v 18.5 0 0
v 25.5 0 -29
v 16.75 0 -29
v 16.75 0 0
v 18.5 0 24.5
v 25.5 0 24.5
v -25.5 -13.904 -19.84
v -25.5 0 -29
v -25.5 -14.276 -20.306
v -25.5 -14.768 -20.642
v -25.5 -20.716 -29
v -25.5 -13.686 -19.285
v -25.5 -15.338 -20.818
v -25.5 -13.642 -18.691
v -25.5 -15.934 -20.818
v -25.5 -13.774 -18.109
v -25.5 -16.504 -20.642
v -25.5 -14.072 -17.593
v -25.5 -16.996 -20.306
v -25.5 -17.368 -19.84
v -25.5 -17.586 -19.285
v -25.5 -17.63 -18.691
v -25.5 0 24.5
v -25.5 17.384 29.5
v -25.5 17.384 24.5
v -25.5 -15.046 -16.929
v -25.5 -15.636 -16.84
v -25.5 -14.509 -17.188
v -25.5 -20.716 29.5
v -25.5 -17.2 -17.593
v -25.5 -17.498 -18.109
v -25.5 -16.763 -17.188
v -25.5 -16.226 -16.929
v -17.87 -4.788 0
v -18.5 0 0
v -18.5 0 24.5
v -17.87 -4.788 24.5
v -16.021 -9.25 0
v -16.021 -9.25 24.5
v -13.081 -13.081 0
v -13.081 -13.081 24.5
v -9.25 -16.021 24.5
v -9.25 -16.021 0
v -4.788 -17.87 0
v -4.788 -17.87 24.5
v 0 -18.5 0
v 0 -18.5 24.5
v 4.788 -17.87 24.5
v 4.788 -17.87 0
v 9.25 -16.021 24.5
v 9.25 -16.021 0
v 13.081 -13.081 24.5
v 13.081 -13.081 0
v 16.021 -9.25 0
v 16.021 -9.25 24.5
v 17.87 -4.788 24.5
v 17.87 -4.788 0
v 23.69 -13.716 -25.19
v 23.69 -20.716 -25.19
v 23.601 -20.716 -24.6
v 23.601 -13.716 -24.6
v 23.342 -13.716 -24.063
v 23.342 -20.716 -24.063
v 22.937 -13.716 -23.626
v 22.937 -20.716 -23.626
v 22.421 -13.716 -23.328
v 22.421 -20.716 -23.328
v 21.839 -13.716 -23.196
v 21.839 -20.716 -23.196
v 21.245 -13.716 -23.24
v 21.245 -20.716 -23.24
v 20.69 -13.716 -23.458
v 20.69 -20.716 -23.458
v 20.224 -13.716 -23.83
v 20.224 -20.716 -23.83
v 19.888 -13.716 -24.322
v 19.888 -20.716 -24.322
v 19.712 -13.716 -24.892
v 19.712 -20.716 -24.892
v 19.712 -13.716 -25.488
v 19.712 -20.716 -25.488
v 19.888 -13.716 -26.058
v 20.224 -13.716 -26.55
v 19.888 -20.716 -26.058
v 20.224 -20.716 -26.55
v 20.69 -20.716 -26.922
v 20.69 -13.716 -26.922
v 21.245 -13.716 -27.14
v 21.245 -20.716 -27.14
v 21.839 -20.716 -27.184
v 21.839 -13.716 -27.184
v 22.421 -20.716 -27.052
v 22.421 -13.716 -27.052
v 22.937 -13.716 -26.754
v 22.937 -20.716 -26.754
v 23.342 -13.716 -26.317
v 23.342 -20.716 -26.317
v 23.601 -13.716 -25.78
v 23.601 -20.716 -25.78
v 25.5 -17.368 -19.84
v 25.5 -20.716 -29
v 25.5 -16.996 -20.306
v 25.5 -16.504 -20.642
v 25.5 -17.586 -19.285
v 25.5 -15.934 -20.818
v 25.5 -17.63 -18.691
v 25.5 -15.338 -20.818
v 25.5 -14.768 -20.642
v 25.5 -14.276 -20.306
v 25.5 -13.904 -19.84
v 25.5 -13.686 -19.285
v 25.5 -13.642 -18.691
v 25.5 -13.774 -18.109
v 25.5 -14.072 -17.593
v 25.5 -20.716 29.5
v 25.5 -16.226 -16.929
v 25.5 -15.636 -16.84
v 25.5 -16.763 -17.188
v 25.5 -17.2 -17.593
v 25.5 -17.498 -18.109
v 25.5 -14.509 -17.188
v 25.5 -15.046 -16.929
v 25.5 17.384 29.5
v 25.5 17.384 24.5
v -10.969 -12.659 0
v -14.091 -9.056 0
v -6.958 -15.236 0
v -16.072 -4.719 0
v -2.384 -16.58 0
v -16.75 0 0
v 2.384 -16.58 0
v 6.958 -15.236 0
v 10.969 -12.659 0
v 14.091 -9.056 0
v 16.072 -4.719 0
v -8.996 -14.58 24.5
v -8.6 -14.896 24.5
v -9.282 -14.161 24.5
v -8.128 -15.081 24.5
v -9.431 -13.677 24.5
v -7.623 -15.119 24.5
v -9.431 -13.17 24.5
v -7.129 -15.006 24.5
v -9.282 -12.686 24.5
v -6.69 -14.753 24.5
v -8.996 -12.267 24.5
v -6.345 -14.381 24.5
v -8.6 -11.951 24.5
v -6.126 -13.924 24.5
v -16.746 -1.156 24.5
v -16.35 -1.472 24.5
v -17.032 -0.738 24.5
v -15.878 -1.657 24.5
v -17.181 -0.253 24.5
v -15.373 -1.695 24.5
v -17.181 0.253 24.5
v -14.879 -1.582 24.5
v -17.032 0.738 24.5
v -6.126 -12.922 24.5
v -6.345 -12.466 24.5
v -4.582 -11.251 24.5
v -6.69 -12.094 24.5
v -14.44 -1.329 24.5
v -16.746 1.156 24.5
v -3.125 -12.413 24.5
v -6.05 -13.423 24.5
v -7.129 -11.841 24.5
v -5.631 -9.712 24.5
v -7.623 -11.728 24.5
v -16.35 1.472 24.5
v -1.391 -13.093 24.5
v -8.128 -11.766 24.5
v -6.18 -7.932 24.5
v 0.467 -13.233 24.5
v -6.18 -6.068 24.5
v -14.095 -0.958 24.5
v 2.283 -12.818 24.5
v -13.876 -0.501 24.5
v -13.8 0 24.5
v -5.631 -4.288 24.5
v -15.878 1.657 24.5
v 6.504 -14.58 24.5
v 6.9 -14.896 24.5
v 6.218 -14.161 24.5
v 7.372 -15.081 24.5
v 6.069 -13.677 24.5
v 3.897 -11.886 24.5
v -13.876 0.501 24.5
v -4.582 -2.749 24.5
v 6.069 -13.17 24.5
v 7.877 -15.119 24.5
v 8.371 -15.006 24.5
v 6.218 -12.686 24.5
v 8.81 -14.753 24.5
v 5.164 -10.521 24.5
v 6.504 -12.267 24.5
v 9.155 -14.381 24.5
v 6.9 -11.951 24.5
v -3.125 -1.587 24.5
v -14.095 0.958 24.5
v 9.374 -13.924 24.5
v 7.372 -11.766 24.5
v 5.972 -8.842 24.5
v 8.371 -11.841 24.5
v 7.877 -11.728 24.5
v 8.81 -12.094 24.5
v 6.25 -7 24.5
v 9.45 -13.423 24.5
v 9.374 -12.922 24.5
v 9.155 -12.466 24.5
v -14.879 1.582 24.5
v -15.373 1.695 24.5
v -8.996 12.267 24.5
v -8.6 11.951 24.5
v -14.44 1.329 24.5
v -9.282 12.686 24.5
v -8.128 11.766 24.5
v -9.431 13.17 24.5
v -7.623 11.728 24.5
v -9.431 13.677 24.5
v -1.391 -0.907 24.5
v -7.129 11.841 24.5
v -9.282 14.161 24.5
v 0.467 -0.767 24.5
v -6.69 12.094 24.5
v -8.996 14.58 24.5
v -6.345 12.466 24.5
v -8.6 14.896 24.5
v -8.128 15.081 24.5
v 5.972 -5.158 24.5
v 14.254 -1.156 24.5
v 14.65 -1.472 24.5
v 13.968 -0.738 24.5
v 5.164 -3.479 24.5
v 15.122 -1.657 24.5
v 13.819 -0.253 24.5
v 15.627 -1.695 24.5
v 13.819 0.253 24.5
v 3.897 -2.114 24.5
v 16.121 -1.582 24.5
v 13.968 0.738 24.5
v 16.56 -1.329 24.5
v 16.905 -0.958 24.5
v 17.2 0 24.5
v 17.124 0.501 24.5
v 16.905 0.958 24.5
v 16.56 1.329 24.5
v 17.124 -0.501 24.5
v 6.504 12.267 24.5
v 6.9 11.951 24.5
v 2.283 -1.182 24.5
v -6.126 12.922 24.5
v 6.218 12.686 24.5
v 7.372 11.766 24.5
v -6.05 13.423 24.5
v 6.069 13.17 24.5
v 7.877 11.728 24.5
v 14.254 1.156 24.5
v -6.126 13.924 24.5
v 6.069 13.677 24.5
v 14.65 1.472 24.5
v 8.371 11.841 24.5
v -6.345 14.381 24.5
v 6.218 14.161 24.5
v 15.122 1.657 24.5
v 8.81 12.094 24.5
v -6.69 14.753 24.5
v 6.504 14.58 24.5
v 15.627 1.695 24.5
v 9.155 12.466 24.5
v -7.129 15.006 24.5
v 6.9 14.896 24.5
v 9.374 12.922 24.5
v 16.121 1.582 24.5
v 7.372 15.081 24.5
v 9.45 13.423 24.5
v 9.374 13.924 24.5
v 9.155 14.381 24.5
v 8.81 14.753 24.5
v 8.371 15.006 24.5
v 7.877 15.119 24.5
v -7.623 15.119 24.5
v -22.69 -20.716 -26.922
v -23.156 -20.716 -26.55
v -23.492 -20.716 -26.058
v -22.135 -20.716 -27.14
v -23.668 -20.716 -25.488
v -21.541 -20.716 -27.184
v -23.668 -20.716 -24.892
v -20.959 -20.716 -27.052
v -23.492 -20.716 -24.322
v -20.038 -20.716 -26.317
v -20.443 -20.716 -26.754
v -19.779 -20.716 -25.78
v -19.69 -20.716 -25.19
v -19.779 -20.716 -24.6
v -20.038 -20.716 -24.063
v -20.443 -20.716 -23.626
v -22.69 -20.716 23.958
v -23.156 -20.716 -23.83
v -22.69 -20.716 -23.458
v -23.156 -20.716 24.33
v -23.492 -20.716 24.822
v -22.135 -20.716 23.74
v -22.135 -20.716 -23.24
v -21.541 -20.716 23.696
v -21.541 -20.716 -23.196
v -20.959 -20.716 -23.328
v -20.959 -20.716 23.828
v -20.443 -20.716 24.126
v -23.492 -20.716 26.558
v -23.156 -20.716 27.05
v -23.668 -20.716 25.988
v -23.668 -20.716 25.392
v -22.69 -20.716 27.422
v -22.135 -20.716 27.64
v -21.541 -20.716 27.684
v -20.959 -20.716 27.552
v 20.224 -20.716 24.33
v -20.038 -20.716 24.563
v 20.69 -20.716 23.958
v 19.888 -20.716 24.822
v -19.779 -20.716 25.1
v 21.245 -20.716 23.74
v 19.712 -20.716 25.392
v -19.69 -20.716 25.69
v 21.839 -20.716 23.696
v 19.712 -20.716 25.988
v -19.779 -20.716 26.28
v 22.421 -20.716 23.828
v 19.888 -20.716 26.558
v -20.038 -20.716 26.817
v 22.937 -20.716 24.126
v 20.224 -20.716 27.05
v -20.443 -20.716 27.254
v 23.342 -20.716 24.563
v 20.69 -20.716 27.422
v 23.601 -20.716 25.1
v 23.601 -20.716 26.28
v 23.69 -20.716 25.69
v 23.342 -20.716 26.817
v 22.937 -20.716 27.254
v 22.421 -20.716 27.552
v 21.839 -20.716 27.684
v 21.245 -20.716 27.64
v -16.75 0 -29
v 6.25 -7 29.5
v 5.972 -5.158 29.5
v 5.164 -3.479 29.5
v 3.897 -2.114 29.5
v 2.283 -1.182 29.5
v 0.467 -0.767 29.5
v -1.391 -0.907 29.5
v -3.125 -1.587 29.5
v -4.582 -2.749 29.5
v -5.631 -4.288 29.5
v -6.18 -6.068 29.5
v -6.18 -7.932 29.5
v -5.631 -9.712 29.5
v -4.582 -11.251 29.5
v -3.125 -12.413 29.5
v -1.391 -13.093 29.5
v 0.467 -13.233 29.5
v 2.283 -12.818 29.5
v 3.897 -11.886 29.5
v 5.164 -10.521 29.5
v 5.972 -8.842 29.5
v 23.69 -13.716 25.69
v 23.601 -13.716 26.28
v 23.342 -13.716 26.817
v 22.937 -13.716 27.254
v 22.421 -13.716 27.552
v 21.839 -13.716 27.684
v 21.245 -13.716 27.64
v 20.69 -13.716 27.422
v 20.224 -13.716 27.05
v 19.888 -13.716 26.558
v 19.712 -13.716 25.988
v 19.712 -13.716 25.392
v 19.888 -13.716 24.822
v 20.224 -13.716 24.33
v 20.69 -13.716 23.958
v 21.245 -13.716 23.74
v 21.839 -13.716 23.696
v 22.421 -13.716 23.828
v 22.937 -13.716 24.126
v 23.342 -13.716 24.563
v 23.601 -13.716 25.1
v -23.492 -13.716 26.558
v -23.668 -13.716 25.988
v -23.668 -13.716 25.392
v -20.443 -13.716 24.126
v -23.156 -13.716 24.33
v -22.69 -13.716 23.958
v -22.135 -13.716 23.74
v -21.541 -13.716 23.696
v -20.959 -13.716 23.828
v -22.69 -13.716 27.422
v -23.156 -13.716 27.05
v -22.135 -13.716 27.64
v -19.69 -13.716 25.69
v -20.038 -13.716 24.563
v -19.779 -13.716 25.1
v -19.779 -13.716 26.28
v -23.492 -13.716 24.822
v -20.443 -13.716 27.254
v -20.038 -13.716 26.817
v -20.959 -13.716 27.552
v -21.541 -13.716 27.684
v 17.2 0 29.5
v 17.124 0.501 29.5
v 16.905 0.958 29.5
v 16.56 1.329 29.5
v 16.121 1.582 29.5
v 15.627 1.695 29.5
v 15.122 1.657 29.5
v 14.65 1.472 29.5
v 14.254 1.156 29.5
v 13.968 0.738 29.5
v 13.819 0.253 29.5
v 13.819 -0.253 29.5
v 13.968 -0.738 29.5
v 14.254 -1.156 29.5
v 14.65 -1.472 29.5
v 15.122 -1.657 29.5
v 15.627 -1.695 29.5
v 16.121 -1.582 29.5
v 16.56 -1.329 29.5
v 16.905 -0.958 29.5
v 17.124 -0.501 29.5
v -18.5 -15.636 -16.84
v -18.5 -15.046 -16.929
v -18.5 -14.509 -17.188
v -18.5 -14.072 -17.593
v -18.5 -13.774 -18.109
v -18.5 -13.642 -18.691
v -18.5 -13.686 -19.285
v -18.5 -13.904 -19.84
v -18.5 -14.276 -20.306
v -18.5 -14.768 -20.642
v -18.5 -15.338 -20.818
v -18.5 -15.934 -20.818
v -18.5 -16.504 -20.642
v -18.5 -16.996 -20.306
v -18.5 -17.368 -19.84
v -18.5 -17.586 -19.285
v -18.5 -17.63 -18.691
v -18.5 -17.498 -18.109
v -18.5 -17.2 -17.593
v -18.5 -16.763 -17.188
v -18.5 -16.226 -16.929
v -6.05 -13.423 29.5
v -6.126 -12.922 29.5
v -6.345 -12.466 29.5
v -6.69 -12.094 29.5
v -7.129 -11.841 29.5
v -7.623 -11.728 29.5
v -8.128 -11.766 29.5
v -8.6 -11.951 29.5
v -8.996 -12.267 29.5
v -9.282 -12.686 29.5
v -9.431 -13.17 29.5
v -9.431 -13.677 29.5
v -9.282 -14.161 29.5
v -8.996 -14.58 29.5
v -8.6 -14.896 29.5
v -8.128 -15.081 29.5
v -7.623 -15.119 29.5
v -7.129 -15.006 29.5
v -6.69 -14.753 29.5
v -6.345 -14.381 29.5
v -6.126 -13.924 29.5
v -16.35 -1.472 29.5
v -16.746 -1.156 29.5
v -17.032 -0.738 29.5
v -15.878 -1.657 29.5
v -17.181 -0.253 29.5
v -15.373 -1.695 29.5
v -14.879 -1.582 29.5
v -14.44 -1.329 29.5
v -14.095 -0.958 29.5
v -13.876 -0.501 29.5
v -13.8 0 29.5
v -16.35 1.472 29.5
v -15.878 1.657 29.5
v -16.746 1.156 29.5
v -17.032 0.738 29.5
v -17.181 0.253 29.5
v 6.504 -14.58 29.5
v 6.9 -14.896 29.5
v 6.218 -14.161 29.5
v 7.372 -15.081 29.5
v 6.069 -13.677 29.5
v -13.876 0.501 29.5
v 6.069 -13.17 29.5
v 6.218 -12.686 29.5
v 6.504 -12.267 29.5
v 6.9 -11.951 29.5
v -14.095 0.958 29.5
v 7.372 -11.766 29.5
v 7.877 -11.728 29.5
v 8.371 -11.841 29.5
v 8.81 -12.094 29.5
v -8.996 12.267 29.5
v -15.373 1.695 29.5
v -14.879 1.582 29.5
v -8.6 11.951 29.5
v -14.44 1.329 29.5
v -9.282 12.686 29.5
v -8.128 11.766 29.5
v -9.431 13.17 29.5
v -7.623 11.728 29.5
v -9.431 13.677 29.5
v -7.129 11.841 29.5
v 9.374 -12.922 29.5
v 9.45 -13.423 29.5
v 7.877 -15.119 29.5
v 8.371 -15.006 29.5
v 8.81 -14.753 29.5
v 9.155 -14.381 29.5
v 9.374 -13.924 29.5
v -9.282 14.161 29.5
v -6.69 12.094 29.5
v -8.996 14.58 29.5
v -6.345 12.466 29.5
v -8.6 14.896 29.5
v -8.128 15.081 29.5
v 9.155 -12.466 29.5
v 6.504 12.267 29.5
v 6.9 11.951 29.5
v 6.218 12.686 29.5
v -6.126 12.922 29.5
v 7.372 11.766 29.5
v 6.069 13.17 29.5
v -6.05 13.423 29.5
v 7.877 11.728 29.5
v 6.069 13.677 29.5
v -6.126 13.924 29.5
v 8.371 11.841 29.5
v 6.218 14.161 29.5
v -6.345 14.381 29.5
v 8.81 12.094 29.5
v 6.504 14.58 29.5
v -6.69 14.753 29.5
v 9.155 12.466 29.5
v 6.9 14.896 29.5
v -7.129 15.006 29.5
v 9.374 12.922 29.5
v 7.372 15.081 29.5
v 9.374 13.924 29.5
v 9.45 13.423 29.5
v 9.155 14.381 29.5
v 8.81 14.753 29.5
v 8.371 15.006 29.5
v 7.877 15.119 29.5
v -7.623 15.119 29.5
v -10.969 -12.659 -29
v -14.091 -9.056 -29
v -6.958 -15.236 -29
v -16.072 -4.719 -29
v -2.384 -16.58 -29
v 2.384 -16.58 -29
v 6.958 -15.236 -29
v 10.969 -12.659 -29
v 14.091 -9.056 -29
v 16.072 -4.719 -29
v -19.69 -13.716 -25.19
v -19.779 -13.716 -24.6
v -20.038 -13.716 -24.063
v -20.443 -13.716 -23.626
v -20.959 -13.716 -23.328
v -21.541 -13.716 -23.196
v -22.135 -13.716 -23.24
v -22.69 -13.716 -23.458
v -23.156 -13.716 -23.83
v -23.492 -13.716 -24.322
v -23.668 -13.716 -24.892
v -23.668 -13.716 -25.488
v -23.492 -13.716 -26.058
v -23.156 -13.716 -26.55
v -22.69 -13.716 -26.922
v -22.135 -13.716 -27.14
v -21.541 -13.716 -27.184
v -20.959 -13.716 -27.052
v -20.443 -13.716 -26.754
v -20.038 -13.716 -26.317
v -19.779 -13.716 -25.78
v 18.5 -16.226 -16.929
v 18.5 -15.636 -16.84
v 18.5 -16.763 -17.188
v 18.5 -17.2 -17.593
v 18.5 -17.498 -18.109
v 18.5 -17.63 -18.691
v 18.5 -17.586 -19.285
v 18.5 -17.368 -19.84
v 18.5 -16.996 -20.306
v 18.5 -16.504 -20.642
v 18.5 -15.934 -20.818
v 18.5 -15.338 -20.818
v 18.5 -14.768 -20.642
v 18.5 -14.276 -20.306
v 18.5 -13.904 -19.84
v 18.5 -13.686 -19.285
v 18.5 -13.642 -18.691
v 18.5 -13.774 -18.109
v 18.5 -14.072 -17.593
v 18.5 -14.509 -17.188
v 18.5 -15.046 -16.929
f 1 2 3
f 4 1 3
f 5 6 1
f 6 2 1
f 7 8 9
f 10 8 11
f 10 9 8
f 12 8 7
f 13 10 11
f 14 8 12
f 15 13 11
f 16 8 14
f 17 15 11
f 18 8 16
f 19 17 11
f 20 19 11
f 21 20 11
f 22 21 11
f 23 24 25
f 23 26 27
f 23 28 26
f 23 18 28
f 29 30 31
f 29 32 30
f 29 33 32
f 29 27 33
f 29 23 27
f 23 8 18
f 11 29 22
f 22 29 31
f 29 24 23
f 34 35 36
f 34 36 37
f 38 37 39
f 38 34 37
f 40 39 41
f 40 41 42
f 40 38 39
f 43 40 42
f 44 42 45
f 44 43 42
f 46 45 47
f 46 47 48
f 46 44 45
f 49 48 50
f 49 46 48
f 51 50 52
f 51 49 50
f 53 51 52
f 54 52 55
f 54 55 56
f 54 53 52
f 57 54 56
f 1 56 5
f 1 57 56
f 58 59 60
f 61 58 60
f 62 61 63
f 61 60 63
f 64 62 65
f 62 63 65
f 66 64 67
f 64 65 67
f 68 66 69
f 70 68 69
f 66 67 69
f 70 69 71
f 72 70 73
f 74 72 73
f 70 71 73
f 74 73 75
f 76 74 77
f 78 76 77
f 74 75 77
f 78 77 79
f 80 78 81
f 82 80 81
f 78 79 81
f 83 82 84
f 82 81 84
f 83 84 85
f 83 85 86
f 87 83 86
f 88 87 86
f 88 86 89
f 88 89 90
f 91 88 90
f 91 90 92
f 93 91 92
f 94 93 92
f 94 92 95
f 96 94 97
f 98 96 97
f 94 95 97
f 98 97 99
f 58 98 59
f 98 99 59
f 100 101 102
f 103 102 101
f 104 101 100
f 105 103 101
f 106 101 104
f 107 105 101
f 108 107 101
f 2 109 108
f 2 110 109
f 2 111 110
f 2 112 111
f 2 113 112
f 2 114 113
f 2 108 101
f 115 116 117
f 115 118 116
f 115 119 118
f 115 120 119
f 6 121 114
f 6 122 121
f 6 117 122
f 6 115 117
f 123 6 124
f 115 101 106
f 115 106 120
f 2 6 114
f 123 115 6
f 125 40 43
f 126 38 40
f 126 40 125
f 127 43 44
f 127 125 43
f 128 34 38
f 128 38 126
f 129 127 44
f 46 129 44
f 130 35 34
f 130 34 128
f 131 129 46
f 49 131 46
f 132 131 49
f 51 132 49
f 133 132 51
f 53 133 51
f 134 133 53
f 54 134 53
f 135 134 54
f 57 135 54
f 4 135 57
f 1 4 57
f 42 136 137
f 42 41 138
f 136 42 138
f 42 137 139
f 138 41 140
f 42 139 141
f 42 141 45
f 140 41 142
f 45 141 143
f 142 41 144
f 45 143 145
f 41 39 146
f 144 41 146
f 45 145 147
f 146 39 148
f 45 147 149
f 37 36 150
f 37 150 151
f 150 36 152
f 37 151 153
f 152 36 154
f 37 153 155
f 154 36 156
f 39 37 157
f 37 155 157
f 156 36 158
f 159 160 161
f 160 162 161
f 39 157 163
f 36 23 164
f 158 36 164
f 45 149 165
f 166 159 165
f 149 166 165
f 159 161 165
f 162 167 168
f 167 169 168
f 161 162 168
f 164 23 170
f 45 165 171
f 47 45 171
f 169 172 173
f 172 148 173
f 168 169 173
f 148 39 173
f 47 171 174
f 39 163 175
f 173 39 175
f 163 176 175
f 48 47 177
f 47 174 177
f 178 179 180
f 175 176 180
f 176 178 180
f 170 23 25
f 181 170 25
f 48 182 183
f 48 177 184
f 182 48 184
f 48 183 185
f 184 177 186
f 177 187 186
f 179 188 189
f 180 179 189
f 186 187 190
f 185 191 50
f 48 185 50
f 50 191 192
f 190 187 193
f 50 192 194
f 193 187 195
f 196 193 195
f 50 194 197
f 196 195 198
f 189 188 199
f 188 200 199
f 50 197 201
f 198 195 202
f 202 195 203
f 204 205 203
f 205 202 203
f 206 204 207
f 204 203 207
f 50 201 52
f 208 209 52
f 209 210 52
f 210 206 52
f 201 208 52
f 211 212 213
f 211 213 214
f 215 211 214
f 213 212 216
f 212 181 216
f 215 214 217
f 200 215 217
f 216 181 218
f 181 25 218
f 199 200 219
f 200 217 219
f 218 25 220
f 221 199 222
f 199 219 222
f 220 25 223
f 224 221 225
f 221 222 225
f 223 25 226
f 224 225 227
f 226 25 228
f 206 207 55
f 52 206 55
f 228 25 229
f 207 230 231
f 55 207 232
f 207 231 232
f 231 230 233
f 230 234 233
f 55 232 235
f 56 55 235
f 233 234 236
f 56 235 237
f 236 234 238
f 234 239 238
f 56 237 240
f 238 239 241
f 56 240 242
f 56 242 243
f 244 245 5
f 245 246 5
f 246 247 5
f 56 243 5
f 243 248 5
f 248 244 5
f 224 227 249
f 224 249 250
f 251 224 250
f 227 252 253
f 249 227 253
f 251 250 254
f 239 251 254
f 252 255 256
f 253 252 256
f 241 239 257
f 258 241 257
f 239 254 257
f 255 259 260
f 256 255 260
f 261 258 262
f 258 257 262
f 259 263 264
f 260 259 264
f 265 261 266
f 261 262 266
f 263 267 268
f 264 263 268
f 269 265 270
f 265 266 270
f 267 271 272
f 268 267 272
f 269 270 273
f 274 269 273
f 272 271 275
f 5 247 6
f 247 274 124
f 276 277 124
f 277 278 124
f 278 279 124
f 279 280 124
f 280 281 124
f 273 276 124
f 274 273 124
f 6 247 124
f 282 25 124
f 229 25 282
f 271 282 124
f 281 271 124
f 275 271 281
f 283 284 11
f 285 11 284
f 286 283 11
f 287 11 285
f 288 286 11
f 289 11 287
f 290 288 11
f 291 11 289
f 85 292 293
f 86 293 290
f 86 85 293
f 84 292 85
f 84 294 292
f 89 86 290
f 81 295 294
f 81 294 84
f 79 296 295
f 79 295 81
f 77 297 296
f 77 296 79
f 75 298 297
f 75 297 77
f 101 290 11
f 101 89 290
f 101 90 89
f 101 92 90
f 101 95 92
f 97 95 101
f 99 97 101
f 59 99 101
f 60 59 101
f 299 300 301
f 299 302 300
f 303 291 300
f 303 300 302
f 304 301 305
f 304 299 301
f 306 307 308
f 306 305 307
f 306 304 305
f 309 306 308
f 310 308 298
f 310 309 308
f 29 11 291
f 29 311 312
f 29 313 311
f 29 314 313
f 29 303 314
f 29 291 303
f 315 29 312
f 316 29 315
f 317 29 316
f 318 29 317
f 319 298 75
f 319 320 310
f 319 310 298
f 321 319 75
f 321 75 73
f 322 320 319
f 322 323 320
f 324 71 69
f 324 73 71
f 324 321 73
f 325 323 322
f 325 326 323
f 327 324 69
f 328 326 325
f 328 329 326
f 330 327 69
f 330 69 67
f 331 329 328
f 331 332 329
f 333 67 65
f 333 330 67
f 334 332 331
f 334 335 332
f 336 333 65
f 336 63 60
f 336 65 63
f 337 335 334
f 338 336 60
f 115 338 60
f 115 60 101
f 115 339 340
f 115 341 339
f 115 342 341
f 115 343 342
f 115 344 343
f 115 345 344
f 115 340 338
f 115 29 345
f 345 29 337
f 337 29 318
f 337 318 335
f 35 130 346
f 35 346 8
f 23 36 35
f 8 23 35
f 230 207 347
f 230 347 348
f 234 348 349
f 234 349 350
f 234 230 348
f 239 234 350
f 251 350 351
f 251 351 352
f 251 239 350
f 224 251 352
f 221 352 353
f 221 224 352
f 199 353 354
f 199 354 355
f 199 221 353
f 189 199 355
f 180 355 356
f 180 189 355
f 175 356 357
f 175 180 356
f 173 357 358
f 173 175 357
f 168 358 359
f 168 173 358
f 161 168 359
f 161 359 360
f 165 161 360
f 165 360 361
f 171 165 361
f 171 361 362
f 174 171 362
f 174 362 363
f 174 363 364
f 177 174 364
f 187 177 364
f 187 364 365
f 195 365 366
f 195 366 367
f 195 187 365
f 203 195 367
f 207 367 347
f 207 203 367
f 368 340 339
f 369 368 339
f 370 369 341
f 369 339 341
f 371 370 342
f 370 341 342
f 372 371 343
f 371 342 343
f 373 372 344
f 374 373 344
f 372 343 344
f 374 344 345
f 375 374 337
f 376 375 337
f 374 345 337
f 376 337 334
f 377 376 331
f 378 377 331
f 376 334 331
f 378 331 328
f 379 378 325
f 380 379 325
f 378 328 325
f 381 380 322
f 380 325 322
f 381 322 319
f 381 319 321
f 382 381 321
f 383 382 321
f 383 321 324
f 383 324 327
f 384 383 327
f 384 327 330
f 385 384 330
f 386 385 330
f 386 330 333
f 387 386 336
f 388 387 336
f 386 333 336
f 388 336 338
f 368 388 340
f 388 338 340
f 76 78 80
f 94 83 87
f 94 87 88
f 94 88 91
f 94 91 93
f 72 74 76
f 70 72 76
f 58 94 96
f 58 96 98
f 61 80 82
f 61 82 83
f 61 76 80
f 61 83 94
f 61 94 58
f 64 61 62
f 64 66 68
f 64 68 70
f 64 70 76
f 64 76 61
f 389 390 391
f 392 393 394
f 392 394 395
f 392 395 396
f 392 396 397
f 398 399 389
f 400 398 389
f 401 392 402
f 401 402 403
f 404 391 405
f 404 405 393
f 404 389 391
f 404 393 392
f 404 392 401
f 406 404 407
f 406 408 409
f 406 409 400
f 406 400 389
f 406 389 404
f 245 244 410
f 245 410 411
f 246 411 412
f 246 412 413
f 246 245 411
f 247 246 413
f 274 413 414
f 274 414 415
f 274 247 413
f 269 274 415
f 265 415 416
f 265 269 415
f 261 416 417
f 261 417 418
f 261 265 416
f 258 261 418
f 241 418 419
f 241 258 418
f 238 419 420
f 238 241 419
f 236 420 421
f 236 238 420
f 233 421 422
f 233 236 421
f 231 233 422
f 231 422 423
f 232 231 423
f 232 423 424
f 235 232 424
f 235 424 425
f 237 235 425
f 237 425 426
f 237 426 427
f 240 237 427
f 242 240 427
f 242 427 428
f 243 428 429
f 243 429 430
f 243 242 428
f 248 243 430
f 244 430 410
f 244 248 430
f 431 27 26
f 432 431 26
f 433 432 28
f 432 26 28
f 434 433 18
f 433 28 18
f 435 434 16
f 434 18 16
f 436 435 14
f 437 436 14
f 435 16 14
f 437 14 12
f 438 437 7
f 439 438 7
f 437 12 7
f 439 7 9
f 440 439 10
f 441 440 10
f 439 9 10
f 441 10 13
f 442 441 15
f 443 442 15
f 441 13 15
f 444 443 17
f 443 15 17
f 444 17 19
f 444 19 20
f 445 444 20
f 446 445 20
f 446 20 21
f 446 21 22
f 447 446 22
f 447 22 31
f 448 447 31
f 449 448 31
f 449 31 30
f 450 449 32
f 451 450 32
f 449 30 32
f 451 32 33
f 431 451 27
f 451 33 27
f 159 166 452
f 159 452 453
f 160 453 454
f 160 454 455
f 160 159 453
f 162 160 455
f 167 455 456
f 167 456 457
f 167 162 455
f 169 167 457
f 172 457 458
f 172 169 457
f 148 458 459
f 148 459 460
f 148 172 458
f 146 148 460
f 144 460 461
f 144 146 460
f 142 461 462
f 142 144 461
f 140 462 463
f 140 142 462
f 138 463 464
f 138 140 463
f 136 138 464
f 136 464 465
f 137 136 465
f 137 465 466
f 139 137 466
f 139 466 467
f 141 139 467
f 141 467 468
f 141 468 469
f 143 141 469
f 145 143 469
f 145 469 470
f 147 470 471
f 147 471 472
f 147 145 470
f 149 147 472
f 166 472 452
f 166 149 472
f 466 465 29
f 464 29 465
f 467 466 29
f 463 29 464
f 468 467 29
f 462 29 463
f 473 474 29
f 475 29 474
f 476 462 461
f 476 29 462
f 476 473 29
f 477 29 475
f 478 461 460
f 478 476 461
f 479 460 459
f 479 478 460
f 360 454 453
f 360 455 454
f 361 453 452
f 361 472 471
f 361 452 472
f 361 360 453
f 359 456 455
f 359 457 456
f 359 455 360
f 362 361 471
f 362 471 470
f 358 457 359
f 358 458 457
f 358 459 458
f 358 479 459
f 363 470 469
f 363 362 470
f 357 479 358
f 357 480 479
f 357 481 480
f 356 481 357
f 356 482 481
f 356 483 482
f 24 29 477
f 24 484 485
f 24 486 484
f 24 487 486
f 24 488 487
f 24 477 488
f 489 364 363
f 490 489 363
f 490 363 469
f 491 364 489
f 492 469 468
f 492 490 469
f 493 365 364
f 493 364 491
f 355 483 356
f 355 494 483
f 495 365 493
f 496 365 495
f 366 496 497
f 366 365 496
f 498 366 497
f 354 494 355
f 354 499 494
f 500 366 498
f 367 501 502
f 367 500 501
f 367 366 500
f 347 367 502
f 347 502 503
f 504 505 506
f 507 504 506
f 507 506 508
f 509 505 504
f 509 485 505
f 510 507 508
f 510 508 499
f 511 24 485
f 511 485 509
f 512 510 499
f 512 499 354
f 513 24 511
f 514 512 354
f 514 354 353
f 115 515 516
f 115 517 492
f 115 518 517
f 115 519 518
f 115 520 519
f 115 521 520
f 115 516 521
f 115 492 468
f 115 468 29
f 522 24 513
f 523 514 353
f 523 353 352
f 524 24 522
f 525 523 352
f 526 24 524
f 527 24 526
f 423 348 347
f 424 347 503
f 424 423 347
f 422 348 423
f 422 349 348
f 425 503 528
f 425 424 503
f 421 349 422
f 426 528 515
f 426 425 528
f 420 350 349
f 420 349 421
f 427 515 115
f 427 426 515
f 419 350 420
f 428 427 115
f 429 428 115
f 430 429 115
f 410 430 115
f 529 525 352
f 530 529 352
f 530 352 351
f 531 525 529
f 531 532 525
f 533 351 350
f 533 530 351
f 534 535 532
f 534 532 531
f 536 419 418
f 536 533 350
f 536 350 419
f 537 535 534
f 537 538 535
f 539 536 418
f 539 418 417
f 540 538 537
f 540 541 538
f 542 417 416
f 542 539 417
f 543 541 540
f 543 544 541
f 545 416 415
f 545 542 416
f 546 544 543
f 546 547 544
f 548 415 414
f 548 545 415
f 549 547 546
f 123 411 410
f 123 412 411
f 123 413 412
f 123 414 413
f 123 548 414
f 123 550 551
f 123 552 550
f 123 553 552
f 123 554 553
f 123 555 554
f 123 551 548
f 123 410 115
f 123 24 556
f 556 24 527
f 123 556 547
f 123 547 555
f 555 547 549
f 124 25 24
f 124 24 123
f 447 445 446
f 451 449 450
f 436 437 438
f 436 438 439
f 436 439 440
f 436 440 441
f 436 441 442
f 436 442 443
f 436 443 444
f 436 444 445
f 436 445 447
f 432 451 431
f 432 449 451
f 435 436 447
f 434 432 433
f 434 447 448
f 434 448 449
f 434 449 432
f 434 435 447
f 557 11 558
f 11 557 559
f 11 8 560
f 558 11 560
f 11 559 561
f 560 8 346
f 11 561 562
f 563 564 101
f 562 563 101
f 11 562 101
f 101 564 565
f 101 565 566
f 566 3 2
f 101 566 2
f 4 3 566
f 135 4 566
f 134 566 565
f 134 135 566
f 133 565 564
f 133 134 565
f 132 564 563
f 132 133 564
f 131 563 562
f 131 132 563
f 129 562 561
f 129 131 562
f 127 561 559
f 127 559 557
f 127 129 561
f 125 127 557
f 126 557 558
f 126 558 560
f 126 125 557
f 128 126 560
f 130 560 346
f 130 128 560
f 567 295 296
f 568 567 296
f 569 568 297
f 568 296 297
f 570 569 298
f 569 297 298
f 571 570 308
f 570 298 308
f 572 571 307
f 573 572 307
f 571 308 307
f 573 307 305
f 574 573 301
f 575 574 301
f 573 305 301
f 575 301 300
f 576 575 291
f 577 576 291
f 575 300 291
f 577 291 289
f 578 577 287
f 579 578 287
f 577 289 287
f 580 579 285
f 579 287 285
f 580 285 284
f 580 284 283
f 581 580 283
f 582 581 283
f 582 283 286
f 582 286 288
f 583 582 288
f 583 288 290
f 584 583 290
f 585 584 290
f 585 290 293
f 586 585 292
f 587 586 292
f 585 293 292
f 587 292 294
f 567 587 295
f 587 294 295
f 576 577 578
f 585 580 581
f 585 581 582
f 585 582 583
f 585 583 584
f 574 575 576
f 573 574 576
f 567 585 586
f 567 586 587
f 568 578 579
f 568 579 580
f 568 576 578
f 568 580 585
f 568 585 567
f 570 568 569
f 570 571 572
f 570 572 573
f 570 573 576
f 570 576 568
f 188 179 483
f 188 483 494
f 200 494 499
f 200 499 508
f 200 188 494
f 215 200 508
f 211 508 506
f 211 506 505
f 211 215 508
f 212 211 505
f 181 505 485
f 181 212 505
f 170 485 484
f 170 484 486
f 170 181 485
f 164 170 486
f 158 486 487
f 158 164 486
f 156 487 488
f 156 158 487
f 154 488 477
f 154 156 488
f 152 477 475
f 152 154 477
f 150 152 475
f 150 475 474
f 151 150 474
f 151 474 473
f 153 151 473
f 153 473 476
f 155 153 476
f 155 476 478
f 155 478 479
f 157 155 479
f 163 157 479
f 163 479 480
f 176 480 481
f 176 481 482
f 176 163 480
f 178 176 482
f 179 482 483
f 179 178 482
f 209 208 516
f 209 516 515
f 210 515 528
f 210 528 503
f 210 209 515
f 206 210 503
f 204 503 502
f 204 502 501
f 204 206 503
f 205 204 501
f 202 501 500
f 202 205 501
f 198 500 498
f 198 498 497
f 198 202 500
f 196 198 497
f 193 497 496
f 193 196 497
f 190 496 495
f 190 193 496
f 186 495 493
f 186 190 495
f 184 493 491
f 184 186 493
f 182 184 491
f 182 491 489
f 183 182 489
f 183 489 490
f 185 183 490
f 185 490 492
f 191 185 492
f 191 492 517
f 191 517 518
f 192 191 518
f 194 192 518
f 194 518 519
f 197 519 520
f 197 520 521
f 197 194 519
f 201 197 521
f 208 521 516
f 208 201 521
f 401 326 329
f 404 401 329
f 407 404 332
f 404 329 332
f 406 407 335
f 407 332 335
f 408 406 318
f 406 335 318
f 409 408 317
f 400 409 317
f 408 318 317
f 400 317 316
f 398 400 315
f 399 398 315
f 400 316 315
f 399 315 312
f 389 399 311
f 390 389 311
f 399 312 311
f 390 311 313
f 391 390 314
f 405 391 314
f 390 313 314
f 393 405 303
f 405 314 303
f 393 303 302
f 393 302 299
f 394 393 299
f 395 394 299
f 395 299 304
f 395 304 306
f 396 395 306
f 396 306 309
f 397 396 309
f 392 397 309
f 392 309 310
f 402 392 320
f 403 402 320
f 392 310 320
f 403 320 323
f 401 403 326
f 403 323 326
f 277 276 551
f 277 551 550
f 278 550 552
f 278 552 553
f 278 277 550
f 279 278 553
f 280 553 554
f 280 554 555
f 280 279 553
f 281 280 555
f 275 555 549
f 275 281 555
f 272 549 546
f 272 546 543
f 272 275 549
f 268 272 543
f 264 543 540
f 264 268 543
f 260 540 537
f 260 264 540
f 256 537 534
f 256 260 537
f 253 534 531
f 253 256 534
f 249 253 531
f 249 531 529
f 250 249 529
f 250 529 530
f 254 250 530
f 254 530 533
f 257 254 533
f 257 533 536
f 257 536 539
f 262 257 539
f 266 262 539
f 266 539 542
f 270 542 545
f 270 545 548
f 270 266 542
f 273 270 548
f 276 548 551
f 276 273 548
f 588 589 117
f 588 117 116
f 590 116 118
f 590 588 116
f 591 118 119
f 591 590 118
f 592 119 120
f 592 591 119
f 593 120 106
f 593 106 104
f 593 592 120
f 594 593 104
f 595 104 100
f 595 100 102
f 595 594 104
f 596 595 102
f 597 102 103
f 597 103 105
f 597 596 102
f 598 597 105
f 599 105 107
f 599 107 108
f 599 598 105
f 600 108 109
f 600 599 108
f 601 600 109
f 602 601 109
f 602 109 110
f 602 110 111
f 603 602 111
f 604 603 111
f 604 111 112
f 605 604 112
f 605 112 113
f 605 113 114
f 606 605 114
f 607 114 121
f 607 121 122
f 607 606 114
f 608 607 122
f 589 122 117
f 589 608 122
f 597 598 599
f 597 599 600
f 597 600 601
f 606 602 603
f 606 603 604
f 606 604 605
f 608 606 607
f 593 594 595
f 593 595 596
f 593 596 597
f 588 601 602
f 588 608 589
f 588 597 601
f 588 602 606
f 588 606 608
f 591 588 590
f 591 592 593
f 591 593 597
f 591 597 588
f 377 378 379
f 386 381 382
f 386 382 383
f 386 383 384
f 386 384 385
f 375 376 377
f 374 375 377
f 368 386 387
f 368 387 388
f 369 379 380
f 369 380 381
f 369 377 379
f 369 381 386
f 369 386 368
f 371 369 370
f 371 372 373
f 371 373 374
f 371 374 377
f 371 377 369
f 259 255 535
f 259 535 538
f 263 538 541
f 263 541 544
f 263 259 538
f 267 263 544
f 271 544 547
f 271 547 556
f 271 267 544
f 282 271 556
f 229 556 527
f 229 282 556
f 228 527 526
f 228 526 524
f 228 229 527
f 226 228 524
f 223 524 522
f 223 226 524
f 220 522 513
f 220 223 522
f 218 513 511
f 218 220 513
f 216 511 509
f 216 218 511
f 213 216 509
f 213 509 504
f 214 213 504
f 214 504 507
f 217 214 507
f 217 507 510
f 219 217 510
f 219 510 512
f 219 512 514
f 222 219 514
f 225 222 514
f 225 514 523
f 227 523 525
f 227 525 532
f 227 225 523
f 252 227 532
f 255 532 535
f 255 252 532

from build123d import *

# Parameters (mm, degrees)
BOSS_EXTRUDE1_DEPTH = 24.500000006
SKETCH2_W           = 51
SKETCH2_H           = 38.1
SKETCH2_R           = 6.25
SKETCH2_R_2         = 1.7
BOSS_EXTRUDE2_DEPTH = 5
BOSS_EXTRUDE3_DEPTH = 29
SKETCH4_R           = 2.000000064
CUT_EXTRUDE1_DEPTH  = 6.99999997
SKETCH5_R           = 2.000000064
CUT_EXTRUDE2_DEPTH  = 6.99999997
CUT_EXTRUDE3_START  = -6.99999997
SKETCH6_R           = 2.000000064
CUT_EXTRUDE3_DEPTH  = 6.99999997


with BuildPart() as part:
    # Sketch1 → Boss-Extrude1 (new body)
    with BuildSketch(Plane.XY):
        with BuildLine():
            Line((18.5, 0), (25.5, 0))
            Line((25.5, 0), (25.5, -20.716))
            Line((25.5, -20.716), (-25.5, -20.716))
            Line((-25.5, -20.716), (-25.5, 0))
            Line((-25.5, 0), (-18.5, 0))
            ThreePointArc((-18.5, 0), (0, -18.5), (18.5, 0))
        make_face()
    extrude(amount=BOSS_EXTRUDE1_DEPTH)

    # Sketch2 → Boss-Extrude2 (add)
    with BuildSketch(Plane.XY.offset(24.500000006)):
        with Locations((0, -1.666)):
            Rectangle(SKETCH2_W, SKETCH2_H)
        with Locations((0, -7)):
            Circle(SKETCH2_R, mode=Mode.SUBTRACT)
        with Locations((15.5, 0)):
            Circle(SKETCH2_R_2, mode=Mode.SUBTRACT)
        with Locations((-7.75, -13.423393759)):
            Circle(SKETCH2_R_2, mode=Mode.SUBTRACT)
        with Locations((-7.75, 13.423393759)):
            Circle(SKETCH2_R_2, mode=Mode.SUBTRACT)
        with Locations((-15.5, 0)):
            Circle(SKETCH2_R_2, mode=Mode.SUBTRACT)
        with Locations((7.75, 13.423393759)):
            Circle(SKETCH2_R_2, mode=Mode.SUBTRACT)
        with Locations((7.75, -13.423393759)):
            Circle(SKETCH2_R_2, mode=Mode.SUBTRACT)
    extrude(amount=BOSS_EXTRUDE2_DEPTH)

    # Sketch3 → Boss-Extrude3 (add)
    with BuildSketch(Plane(origin=(0, 0, 0), x_dir=(-1, 0, 0), z_dir=(0, 0, -1))):
        with BuildLine():
            Line((16.75, 0), (25.5, 0))
            Line((25.5, 0), (25.5, -20.716))
            Line((25.5, -20.716), (-25.5, -20.716))
            Line((-25.5, -20.716), (-25.5, 0))
            Line((-25.5, 0), (-16.75, 0))
            ThreePointArc((-16.75, 0), (0, -16.75), (16.75, 0))
        make_face()
    extrude(amount=BOSS_EXTRUDE3_DEPTH)

    # Sketch4 → Cut-Extrude1 (cut)
    with BuildSketch(Plane.XZ.offset(20.716)):
        with Locations((-21.69, 25.690000006)):
            Circle(SKETCH4_R)
        with Locations((21.69, 25.690000006)):
            Circle(SKETCH4_R)
        with Locations((-21.69, -25.19)):
            Circle(SKETCH4_R)
        with Locations((21.69, -25.19)):
            Circle(SKETCH4_R)
    extrude(amount=-CUT_EXTRUDE1_DEPTH, mode=Mode.SUBTRACT)

    # Sketch5 → Cut-Extrude2 (cut)
    with BuildSketch(Plane.ZY.offset(25.5)):
        with Locations((-18.84, -15.636)):
            Circle(SKETCH5_R)
    extrude(amount=-CUT_EXTRUDE2_DEPTH, mode=Mode.SUBTRACT)

    # Sketch6 → Cut-Extrude3 (cut)
    with BuildSketch(Plane(origin=(25.5, 0, 0), x_dir=(0, 0, -1), z_dir=(1, 0, 0)).offset(CUT_EXTRUDE3_START)):
        with Locations(Location((18.84, -15.636, 0), (0, 0, 180))):
            Circle(SKETCH6_R)
    extrude(amount=CUT_EXTRUDE3_DEPTH, mode=Mode.SUBTRACT)


solid = part.part
